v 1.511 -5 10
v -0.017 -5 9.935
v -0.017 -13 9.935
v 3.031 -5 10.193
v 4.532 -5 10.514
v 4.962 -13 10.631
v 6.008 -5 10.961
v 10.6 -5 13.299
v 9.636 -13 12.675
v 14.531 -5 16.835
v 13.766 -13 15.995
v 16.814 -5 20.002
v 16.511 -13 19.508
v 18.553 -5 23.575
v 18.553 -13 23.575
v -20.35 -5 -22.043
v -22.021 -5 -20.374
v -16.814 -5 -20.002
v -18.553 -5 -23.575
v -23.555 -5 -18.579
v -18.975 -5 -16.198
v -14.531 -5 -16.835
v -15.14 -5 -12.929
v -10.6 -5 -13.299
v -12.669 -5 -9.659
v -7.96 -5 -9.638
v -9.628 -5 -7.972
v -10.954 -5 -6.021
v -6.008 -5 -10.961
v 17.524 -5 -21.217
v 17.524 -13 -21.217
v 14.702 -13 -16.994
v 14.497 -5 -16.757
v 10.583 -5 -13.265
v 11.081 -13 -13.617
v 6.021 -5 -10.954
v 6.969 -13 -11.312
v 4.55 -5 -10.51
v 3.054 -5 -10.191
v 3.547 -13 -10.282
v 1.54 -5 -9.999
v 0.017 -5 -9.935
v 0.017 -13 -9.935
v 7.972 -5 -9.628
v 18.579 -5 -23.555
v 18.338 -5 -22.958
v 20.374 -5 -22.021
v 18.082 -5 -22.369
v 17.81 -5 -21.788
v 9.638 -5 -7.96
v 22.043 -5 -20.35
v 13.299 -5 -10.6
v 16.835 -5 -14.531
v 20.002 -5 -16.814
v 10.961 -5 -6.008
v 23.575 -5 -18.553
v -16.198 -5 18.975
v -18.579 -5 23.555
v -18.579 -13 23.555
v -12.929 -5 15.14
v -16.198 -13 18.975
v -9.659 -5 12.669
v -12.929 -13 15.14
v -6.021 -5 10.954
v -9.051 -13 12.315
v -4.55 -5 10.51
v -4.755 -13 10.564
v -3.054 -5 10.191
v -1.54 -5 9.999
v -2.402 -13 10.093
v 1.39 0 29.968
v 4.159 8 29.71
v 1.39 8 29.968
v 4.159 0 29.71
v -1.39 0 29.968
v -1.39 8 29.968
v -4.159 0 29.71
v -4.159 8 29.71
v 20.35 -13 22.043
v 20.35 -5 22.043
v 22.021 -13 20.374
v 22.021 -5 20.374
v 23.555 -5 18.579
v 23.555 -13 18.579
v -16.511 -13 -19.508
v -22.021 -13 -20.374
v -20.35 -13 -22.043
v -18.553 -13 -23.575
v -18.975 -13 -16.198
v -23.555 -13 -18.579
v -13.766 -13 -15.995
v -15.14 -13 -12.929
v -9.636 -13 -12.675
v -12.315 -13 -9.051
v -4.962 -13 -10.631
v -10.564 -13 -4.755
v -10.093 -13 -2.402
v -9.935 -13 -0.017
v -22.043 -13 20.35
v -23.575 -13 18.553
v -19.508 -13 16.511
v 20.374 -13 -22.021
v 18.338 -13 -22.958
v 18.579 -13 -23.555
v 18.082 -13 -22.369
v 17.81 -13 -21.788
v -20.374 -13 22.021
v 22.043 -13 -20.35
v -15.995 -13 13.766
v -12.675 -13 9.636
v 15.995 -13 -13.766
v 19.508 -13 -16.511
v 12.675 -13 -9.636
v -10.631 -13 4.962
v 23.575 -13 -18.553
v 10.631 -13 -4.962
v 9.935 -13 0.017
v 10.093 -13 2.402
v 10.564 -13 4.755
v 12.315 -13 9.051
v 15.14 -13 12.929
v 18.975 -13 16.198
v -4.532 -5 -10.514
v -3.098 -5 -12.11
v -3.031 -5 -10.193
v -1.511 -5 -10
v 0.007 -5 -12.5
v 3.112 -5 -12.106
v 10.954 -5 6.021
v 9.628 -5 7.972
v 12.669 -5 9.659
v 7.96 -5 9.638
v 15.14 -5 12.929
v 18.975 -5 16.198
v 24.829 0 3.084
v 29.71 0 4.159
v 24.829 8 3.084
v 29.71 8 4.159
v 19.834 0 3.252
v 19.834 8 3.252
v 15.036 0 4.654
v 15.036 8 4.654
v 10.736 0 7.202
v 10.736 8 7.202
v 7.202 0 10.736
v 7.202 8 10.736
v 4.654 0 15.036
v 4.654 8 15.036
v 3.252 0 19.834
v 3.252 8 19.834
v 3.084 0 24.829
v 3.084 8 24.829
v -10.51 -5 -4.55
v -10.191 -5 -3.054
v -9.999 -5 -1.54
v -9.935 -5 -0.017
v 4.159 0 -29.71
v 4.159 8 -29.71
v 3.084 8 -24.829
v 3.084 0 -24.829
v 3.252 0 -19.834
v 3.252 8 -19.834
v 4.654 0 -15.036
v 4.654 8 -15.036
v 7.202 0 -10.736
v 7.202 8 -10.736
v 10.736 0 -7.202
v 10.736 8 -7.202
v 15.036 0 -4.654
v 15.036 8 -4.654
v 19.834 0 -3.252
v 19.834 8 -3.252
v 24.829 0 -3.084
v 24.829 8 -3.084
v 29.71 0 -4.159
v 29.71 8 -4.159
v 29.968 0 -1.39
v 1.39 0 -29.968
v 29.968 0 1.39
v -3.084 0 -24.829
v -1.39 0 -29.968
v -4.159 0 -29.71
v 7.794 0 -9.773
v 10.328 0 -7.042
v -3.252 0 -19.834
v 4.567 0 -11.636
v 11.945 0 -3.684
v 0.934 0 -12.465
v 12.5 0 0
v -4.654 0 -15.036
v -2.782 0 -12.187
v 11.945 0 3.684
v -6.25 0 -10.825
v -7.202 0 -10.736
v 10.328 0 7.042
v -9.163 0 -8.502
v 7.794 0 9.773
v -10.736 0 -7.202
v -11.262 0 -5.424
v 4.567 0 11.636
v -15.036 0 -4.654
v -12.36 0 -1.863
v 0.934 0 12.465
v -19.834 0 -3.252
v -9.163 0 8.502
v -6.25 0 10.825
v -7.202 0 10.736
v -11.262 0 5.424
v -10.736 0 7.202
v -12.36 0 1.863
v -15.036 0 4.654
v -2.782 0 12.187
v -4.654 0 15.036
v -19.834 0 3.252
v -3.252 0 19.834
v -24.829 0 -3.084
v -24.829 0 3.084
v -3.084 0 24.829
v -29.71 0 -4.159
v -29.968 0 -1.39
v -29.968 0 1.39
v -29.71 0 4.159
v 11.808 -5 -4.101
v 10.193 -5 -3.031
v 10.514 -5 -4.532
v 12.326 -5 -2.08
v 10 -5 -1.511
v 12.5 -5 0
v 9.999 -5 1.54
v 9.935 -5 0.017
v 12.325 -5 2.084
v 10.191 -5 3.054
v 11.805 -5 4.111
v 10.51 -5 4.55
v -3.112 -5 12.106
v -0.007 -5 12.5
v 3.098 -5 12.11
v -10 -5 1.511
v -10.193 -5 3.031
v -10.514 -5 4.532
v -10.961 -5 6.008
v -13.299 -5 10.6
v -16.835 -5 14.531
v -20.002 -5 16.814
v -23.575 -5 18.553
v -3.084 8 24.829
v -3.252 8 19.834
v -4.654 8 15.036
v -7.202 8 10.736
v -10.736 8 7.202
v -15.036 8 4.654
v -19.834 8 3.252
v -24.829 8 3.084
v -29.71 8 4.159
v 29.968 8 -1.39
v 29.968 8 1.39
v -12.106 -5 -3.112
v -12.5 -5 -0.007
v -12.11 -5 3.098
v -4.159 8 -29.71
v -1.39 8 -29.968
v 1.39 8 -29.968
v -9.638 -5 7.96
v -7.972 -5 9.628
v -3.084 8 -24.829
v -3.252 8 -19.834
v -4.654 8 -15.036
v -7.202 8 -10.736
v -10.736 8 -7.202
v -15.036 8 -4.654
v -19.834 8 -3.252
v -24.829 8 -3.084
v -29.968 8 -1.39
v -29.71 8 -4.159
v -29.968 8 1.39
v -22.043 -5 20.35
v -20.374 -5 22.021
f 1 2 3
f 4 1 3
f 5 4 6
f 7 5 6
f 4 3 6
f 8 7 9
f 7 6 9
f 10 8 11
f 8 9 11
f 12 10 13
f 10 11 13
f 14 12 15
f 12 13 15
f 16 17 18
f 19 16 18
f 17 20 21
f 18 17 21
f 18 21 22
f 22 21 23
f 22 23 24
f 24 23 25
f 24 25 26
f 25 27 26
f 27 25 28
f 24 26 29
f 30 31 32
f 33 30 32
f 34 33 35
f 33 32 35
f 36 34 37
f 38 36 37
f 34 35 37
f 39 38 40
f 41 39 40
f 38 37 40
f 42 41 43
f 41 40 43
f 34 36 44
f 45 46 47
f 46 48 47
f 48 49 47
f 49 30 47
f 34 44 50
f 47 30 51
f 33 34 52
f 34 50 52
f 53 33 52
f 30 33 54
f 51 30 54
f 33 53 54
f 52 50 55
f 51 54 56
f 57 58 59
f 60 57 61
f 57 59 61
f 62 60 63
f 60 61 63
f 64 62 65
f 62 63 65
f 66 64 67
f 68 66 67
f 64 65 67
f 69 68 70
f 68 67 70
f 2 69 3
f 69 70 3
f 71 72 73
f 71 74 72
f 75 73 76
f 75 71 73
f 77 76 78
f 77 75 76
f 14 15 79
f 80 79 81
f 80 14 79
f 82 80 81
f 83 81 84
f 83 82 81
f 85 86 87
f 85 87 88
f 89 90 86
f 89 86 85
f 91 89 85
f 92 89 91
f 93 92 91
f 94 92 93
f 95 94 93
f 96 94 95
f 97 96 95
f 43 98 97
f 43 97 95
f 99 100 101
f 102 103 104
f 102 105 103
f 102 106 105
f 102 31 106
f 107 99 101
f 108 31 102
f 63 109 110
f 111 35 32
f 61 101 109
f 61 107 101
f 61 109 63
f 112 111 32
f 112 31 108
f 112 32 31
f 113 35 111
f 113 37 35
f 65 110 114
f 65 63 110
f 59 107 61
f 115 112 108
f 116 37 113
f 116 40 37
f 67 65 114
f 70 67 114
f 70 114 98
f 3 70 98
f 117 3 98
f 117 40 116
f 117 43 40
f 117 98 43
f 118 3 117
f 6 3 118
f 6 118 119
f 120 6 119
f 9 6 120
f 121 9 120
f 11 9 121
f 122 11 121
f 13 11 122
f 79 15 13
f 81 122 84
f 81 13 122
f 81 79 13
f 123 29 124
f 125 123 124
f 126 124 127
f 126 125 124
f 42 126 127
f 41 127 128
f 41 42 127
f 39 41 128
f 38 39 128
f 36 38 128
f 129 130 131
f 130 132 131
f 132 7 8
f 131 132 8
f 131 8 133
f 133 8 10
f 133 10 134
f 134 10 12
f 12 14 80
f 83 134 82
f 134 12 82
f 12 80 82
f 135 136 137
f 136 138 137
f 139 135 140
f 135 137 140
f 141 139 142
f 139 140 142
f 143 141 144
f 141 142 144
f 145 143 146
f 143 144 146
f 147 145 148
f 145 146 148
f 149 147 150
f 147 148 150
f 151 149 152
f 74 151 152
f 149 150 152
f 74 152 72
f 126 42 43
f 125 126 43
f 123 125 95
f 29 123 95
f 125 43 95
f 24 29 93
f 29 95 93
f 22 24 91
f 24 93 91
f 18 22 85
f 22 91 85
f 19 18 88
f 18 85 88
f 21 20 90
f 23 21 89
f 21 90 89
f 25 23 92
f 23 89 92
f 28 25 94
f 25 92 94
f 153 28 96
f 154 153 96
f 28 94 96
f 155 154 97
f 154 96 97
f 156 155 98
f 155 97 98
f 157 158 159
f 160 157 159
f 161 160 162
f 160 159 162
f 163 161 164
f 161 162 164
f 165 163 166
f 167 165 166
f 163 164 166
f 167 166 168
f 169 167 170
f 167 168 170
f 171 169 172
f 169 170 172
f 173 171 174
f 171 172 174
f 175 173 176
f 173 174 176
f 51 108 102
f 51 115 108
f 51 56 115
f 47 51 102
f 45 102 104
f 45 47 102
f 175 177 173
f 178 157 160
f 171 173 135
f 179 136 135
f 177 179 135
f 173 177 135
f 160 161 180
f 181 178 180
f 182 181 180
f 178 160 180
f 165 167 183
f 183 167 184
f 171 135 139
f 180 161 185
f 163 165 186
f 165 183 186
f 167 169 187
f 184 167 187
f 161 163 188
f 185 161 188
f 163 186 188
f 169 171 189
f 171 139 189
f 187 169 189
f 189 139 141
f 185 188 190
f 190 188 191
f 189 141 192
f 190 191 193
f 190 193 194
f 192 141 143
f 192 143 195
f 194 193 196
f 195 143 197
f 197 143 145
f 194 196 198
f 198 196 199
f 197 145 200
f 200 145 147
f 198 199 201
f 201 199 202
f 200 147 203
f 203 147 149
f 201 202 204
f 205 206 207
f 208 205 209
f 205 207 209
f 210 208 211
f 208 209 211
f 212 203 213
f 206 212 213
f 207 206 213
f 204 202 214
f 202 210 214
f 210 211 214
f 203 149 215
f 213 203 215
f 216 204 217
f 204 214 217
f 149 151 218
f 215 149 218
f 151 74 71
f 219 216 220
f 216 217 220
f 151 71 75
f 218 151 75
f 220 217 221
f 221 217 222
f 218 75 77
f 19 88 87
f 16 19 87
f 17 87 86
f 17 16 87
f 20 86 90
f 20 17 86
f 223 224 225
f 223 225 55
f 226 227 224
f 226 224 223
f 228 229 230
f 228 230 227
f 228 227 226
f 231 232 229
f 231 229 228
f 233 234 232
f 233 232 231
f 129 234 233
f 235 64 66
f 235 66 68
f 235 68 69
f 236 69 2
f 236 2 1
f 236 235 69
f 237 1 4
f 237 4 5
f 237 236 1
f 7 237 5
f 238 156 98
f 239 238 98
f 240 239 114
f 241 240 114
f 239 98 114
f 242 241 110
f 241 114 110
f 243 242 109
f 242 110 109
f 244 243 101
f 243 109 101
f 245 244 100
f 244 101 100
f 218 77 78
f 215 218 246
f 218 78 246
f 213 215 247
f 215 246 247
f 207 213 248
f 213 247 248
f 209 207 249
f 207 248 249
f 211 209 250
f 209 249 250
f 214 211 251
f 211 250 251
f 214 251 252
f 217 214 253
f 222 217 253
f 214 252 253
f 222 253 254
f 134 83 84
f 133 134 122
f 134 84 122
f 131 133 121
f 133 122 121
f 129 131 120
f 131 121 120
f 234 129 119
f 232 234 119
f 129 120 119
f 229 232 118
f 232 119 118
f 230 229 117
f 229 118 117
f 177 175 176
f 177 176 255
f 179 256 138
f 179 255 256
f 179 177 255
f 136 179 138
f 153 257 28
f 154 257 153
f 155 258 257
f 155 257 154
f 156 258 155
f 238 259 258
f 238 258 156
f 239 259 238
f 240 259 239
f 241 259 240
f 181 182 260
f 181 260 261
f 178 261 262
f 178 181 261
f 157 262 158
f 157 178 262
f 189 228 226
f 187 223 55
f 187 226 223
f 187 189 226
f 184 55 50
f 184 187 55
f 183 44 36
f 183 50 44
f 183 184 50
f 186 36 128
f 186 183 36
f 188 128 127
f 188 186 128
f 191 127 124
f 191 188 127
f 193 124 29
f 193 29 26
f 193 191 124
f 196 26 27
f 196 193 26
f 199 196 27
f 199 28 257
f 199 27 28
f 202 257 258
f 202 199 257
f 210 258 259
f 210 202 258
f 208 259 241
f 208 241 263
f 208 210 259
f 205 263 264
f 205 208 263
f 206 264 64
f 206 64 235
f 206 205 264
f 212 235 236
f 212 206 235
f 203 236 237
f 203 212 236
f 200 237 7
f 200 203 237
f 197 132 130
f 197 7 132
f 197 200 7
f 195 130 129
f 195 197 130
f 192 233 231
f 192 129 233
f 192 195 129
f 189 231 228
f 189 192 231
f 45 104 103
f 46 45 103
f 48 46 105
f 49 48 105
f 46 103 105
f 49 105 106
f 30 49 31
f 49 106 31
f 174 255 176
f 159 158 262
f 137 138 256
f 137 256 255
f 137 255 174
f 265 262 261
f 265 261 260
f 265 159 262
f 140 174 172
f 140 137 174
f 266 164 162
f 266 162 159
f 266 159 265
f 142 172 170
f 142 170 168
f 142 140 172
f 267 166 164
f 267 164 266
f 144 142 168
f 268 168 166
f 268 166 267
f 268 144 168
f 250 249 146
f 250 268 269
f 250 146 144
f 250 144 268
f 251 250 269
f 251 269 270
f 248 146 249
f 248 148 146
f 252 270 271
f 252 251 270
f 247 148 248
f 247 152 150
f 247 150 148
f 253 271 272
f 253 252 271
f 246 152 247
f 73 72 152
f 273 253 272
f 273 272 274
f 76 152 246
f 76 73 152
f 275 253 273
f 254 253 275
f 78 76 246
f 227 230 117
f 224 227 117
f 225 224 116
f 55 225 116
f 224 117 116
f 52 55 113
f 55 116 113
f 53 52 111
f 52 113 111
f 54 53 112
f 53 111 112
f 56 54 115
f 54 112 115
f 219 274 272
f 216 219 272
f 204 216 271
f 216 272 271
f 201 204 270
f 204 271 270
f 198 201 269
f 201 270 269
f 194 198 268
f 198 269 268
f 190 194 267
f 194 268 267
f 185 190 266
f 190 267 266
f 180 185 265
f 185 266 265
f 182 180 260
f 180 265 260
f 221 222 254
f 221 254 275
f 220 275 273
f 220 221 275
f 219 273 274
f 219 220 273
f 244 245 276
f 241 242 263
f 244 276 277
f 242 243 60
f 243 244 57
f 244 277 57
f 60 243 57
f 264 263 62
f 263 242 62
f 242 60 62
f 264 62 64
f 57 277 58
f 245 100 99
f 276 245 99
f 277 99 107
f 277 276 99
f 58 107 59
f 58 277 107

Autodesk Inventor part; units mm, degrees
ref_plane "YZ Plane" through (0, 0, 0) normal (1, 0, 0) x (0, 1, 0)
ref_plane "XZ Plane" through (0, 0, 0) normal (0, 1, 0) x (-1, 0, 0)
ref_plane "XY Plane" through (0, 0, 0) normal (0, 0, 1) x (1, 0, 0)
sketch "スケッチ1" plane through (0, 0, 0) normal (0, 1, 0) x (-1, 0, 0)
  circle A0 centre (0, 0) radius 25
  circle A1 centre (0, 0) radius 30
  dimension "d0" = 50
  dimension "d1" = 60
extrude "押し出し1" add sketch "スケッチ1" along normal blind 8 contours A0 | A1
sketch "スケッチ2" plane through (0, 8, 0) normal (0, 1, 0) x (1, 0, 0)
  circle A0 centre (0, 0) radius 30 projected
  line L0 (0, -30) -> (-30, 0)
  line L1 (-30, 0) -> (0, 30)
  line L2 (0, 30) -> (30, 0)
  line L3 (0, -30) -> (30, 0)
  circle A1 centre (0, 0) radius 30
  circle A2 centre (0, 0) radius 25
  circle A3 centre (-23, 23) radius 20
  circle A4 centre (-23, -23) radius 20
  circle A5 centre (23, -23) radius 20
  circle A6 centre (23, 23) radius 20
  point P0 (-4.1593, 29.7103)
  point P1 (-29.7103, 4.1593)
  dimension "d5" = 50
  dimension "d8" = 23
  dimension "d9" = 23
  dimension "d13" = 360
  dimension "d29" = 40
extrude "押し出し2" cut sketch "スケッチ2" against normal blind 10 contours A6 L2 A2 A0 | A0 A6 | A5 A0 | A0 A5 L3 A2 | A6 A2 L2 | L3 A2 A5 | A2 A6 L2 | L2 A2 | A2 L3 | L3 A2 A5 | L2 A2 A6 | A5 A2 L3 | A3 L1 A2 A0 | A0 A3 | A3 A2 L1 | A4 A0 | A0 A4 L0 A2 | L0 A2 A4 | A3 A2 L1 | A2 L0 A4 | L1 A2 | A2 L0 | L1 A2 A3 | A4 A2 L0
sketch "スケッチ3" plane through (0, 8, 0) normal (0, 1, 0) x (1, 0, 0)
  line L0 (0, -0.0001) -> (0, -29.9755)
  circle A0 centre (-0.0169, 0.0244) radius 30
  line L1 (0, -0.0001) -> (32.5269, -32.527)
  line L2 (32.5269, -32.527) -> (0, -32.527)
  line L3 (21.1924, -21.1926) -> (0, -21.1926)
  ellipse E0 centre (0, -32.527) end of major axis (20.2314, -32.527) minor radius 22.6164
  ellipse E1 centre (32.5345, 0.0414) end of major axis (32.5345, 20.2728) minor radius 22.6164
  ellipse E2 centre (-0.0339, 32.5759) end of major axis (-20.2653, 32.5759) minor radius 22.6164
  ellipse E3 centre (-32.5684, 0.0075) end of major axis (-32.5684, -20.2239) minor radius 22.6164
  point P0 (0, 0)
  point P1 (-4.1509, 30.0937)
  point P2 (-30.9256, 3.319)
  dimension "d50" = 21.1925
  dimension "d51" = 360
sketch "スケッチ4" plane through (0, 0, 0) normal (0, -1, 0) x (1, 0, 0)
  circle A0 centre (0, 0) radius 12.5
  dimension "d15" = 25
extrude "押し出し3" add sketch "スケッチ4" along normal blind 5
sketch "スケッチ5" plane through (0, -5, 0) normal (0, -1, 0) x (1, 0, 0)
  circle A0 centre (0, 0) radius 30
  dimension "d18" = 60
extrude "押し出し4" add sketch "スケッチ5" along normal blind 8
sketch "スケッチ6" plane through (0, -13, 0) normal (0, -1, 0) x (1, 0, 0)
  line L0 (0.0169, -0.0245) -> (0.0169, -30)
  circle A0 centre (0, 0) radius 30 projected
  line L1 (0.0169, -0.0245) -> (32.5438, -32.5514)
  line L2 (32.5438, -32.5514) -> (0.0169, -32.5514)
  line L3 (21.2094, -21.217) -> (0.0169, -21.217)
  ellipse E0 centre (0.0169, -32.5514) end of major axis (20.2483, -32.5514) minor radius 22.6164
  ellipse E1 centre (32.5514, 0.0169) end of major axis (32.5514, 20.2483) minor radius 22.6164
  ellipse E2 centre (-0.0169, 32.5514) end of major axis (-20.2483, 32.5514) minor radius 22.6164
  ellipse E3 centre (-32.5514, -0.0169) end of major axis (-32.5514, -20.2483) minor radius 22.6164
  point P0 (-3.3011, 29.5474)
  point P1 (-30.0758, 2.7727)
  dimension "d43" = 21.1925
  dimension "d46" = 360
extrude "押し出し5" cut sketch "スケッチ6" against normal blind 8 contours E0 L3 L0 | L0 A0 E0 | L3 E0 A0 L0 | A0 E0 | E1 A0 | A0 E1 | E3 A0 | A0 E3 | E2 A0 | A0 E2
